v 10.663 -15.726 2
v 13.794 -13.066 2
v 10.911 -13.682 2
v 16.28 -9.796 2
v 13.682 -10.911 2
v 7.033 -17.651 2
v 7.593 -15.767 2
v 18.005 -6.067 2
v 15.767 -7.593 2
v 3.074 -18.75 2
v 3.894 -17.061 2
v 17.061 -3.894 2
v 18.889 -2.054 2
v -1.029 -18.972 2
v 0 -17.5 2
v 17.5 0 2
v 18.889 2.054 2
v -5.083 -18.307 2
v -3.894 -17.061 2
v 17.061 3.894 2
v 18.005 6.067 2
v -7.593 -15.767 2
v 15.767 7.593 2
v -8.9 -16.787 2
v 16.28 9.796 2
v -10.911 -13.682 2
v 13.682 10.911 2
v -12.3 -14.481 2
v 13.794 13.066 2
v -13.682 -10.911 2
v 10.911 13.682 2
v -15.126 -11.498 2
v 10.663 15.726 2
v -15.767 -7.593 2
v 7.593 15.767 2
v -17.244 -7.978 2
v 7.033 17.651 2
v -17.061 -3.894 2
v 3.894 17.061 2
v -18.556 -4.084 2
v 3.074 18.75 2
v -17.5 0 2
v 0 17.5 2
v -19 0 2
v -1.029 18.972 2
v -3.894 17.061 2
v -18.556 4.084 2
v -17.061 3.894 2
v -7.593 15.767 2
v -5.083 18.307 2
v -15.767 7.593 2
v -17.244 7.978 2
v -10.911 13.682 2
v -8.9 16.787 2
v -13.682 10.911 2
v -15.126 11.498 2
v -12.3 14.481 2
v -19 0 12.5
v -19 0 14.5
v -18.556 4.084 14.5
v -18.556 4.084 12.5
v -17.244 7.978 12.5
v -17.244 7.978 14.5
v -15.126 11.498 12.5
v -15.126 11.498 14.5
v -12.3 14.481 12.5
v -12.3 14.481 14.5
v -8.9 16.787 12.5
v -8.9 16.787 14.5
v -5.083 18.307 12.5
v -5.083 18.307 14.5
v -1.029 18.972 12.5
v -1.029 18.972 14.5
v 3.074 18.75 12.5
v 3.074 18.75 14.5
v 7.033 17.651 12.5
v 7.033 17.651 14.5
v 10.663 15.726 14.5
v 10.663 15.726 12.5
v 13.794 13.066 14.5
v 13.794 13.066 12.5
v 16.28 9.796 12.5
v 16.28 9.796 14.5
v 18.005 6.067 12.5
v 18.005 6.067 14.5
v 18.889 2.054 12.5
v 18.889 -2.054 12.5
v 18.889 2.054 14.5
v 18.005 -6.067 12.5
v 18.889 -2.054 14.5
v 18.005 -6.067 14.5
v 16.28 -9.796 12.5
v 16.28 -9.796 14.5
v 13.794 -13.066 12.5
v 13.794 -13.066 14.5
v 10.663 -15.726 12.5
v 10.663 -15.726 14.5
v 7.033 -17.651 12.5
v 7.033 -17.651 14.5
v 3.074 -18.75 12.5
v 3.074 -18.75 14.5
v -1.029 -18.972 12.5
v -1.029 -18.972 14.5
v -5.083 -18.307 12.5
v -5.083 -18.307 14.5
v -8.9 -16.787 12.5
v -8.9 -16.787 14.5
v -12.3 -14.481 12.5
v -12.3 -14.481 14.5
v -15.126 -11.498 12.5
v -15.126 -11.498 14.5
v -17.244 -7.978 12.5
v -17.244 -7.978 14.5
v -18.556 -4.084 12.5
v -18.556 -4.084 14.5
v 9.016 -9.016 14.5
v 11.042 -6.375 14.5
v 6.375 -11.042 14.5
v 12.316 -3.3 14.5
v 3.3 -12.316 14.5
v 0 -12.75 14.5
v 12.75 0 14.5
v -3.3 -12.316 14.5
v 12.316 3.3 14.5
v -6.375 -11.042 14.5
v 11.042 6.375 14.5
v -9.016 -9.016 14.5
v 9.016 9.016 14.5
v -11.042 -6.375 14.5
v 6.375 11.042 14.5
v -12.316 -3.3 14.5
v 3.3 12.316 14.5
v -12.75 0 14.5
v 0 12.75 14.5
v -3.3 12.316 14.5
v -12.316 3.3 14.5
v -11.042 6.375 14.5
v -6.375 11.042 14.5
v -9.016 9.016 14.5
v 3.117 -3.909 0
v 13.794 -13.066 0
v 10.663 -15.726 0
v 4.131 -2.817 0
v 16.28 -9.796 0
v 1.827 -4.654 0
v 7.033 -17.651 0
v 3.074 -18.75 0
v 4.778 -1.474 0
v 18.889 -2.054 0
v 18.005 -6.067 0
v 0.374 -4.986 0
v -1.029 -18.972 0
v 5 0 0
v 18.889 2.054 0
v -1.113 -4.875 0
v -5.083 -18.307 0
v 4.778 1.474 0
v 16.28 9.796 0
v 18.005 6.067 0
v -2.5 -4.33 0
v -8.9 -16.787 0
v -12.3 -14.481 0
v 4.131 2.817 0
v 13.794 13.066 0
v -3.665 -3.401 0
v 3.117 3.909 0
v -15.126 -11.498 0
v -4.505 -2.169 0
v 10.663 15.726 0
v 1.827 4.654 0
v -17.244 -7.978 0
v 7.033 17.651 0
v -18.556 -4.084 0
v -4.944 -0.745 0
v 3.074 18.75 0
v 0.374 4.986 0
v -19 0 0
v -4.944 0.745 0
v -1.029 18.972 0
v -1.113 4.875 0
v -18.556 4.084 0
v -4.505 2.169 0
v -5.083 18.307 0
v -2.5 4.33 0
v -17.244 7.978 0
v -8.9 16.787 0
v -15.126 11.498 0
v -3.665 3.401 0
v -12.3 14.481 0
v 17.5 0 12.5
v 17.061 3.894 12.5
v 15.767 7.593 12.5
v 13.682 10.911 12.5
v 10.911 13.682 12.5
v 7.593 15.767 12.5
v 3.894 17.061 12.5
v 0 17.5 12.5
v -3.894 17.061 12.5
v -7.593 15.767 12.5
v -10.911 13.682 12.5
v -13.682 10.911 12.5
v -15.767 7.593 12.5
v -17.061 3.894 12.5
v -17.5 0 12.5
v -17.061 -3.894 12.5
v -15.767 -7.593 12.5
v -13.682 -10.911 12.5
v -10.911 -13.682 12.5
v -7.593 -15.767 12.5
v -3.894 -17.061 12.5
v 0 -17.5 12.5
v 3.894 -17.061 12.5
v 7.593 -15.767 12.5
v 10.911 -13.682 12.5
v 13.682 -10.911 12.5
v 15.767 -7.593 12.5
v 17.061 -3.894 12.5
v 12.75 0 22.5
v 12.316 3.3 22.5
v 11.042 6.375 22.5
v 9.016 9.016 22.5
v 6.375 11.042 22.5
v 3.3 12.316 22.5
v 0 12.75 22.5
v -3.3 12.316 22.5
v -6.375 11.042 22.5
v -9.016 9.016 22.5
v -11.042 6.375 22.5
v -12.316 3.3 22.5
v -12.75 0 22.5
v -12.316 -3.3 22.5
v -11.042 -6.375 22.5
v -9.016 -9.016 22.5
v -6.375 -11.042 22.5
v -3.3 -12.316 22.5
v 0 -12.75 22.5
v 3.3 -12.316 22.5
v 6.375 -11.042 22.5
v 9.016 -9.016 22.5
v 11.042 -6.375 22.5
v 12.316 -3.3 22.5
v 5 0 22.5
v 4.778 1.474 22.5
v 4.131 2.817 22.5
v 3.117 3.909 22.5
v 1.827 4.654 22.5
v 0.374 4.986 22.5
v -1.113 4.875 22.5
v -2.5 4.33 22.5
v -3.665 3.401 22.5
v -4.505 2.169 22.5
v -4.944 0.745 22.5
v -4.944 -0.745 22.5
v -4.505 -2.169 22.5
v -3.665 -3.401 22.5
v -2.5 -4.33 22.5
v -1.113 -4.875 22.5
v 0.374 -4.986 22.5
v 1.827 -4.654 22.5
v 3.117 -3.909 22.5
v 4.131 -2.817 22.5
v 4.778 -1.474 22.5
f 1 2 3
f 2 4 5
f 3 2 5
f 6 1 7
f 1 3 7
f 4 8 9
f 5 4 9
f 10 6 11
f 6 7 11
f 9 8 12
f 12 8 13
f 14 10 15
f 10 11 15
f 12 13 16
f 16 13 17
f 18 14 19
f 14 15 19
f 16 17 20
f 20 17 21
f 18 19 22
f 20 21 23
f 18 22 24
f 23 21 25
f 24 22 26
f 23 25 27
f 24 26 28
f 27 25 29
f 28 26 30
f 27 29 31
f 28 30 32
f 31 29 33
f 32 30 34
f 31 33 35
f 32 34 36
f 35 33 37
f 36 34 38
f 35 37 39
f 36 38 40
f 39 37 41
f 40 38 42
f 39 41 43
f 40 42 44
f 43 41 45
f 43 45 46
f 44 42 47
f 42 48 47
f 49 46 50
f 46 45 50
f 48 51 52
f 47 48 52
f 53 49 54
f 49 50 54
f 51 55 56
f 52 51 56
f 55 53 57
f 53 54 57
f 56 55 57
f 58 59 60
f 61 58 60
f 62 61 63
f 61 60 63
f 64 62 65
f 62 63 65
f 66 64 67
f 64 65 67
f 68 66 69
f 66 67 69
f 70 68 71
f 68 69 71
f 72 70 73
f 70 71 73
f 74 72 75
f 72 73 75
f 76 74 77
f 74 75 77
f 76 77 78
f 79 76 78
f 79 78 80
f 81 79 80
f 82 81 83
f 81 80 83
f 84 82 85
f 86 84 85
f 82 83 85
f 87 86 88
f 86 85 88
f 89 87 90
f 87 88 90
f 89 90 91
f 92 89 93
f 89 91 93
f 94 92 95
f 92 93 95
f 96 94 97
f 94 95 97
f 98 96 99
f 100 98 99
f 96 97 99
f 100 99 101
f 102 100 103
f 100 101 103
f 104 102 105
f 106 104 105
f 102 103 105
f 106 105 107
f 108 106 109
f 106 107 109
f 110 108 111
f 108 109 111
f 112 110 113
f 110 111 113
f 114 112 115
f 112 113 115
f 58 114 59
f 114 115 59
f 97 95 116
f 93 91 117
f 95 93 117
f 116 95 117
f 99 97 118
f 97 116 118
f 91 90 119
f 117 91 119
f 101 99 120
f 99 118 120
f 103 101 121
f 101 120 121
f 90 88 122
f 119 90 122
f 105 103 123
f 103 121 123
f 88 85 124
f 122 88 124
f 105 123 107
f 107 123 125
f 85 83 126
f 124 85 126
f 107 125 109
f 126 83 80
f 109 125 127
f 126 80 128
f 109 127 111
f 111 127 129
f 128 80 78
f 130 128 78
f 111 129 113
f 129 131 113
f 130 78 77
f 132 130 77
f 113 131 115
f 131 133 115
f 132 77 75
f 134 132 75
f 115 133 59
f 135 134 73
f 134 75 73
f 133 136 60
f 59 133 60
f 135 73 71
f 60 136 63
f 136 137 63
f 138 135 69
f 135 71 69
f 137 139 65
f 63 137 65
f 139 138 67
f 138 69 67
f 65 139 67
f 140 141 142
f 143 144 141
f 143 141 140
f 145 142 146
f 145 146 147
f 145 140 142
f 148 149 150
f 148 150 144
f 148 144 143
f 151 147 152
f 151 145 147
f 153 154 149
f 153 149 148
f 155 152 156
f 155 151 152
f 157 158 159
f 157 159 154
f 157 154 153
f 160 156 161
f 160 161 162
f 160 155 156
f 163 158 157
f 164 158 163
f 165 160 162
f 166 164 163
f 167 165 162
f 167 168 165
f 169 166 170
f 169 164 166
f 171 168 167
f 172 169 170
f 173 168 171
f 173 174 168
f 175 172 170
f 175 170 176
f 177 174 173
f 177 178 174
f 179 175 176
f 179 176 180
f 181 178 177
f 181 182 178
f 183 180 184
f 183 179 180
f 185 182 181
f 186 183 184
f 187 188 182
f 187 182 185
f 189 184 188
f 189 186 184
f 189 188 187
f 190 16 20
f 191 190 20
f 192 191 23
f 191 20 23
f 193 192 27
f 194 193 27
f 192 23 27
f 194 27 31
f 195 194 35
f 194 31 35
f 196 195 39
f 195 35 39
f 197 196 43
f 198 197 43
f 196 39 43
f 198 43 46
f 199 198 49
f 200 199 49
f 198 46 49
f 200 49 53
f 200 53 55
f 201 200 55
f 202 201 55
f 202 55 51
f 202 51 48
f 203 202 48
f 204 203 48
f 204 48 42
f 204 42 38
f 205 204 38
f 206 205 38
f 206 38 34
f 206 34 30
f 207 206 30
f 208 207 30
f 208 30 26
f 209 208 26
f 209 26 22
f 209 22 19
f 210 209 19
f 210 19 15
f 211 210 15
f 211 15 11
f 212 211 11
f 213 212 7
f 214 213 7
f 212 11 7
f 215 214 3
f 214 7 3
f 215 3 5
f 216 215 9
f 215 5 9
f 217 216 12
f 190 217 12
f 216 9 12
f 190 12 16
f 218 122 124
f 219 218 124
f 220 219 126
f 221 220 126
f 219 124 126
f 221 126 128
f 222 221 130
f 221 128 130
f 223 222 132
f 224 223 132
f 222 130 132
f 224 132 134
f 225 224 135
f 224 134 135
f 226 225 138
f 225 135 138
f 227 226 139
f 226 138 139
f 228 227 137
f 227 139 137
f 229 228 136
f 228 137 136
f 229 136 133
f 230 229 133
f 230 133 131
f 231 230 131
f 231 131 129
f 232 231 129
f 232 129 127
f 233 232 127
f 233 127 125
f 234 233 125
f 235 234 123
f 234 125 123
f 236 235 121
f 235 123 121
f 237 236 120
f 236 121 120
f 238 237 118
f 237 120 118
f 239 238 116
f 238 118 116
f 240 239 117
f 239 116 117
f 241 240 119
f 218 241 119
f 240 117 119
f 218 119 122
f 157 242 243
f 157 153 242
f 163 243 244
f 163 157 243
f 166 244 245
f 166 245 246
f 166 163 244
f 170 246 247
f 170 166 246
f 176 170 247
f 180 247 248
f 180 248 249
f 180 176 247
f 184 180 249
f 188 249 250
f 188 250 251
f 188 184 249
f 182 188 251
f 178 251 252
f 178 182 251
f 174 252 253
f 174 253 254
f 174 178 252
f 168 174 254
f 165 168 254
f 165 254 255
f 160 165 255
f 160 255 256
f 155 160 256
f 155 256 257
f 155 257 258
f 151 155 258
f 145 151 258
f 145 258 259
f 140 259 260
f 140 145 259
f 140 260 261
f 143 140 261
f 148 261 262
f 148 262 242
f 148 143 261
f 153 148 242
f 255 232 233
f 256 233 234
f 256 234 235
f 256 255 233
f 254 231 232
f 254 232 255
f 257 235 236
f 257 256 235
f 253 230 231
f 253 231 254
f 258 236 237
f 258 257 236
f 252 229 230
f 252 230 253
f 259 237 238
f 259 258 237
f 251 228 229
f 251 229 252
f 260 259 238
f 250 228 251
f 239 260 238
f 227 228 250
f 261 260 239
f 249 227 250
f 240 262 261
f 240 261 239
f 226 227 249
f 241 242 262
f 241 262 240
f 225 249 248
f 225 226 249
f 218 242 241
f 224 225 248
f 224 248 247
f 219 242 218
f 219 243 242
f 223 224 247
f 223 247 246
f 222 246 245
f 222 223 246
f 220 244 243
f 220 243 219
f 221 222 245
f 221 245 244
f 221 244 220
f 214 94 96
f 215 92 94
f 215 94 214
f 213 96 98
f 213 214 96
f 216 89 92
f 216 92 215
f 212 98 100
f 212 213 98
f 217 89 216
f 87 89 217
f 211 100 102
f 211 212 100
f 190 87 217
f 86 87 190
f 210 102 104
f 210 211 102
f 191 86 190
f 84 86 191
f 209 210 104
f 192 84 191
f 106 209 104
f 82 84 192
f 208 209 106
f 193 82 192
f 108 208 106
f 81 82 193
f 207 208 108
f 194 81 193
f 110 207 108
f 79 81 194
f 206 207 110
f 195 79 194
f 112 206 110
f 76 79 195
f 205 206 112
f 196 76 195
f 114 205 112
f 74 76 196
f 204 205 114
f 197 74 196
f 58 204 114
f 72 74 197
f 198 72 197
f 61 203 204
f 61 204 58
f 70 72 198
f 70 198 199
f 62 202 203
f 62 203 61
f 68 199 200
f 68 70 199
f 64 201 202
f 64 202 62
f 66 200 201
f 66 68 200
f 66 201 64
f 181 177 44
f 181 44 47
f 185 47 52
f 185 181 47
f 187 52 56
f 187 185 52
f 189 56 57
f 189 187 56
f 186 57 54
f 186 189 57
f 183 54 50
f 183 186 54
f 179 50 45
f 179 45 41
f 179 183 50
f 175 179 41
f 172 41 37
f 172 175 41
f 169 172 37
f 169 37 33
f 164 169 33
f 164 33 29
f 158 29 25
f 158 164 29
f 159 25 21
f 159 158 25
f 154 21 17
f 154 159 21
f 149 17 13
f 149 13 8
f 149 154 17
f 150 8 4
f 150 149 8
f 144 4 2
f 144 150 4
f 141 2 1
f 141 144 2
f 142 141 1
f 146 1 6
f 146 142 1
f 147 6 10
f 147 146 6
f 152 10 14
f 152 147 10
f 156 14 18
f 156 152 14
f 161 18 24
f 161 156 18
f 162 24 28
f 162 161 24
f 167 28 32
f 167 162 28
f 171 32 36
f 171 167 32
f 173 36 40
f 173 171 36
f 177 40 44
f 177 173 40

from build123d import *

# Parameters (mm, degrees)
SKETCH1_R           = 17.5
SKETCH1_R_2         = 5
BOSS_EXTRUDE1_DEPTH = 14.5
SKETCH2_R           = 12.75
SKETCH2_R_2         = 5
BOSS_EXTRUDE2_DEPTH = 8
SKETCH3_R           = 19
SKETCH3_R_2         = 17.5
BOSS_EXTRUDE3_DEPTH = 2
BOSS_EXTRUDE5_START = -14.5
SKETCH3_2_R         = 19
SKETCH3_2_R_2       = 17.5
BOSS_EXTRUDE5_DEPTH = 2


with BuildPart() as part:
    # Sketch1 → Boss-Extrude1 (new body)
    with BuildSketch(Plane.XY):
        Circle(SKETCH1_R)
        Circle(SKETCH1_R_2, mode=Mode.SUBTRACT)
    extrude(amount=BOSS_EXTRUDE1_DEPTH)

    # Sketch2 → Boss-Extrude2 (add)
    with BuildSketch(Plane.XY.offset(14.5)):
        Circle(SKETCH2_R)
        Circle(SKETCH2_R_2, mode=Mode.SUBTRACT)
    extrude(amount=BOSS_EXTRUDE2_DEPTH)

    # Sketch3 → Boss-Extrude3 (add)
    with BuildSketch(Plane(origin=(0, 0, 0), x_dir=(-1, 0, 0), z_dir=(0, 0, -1))):
        Circle(SKETCH3_R)
        Circle(SKETCH3_R_2, mode=Mode.SUBTRACT)
    extrude(amount=-BOSS_EXTRUDE3_DEPTH)

    # Sketch3<2> → Boss-Extrude5 (add)
    with BuildSketch(Plane(origin=(0, 0, 0), x_dir=(-1, 0, 0), z_dir=(0, 0, -1)).offset(BOSS_EXTRUDE5_START)):
        Circle(SKETCH3_2_R)
        Circle(SKETCH3_2_R_2, mode=Mode.SUBTRACT)
    extrude(amount=BOSS_EXTRUDE5_DEPTH)


solid = part.part
